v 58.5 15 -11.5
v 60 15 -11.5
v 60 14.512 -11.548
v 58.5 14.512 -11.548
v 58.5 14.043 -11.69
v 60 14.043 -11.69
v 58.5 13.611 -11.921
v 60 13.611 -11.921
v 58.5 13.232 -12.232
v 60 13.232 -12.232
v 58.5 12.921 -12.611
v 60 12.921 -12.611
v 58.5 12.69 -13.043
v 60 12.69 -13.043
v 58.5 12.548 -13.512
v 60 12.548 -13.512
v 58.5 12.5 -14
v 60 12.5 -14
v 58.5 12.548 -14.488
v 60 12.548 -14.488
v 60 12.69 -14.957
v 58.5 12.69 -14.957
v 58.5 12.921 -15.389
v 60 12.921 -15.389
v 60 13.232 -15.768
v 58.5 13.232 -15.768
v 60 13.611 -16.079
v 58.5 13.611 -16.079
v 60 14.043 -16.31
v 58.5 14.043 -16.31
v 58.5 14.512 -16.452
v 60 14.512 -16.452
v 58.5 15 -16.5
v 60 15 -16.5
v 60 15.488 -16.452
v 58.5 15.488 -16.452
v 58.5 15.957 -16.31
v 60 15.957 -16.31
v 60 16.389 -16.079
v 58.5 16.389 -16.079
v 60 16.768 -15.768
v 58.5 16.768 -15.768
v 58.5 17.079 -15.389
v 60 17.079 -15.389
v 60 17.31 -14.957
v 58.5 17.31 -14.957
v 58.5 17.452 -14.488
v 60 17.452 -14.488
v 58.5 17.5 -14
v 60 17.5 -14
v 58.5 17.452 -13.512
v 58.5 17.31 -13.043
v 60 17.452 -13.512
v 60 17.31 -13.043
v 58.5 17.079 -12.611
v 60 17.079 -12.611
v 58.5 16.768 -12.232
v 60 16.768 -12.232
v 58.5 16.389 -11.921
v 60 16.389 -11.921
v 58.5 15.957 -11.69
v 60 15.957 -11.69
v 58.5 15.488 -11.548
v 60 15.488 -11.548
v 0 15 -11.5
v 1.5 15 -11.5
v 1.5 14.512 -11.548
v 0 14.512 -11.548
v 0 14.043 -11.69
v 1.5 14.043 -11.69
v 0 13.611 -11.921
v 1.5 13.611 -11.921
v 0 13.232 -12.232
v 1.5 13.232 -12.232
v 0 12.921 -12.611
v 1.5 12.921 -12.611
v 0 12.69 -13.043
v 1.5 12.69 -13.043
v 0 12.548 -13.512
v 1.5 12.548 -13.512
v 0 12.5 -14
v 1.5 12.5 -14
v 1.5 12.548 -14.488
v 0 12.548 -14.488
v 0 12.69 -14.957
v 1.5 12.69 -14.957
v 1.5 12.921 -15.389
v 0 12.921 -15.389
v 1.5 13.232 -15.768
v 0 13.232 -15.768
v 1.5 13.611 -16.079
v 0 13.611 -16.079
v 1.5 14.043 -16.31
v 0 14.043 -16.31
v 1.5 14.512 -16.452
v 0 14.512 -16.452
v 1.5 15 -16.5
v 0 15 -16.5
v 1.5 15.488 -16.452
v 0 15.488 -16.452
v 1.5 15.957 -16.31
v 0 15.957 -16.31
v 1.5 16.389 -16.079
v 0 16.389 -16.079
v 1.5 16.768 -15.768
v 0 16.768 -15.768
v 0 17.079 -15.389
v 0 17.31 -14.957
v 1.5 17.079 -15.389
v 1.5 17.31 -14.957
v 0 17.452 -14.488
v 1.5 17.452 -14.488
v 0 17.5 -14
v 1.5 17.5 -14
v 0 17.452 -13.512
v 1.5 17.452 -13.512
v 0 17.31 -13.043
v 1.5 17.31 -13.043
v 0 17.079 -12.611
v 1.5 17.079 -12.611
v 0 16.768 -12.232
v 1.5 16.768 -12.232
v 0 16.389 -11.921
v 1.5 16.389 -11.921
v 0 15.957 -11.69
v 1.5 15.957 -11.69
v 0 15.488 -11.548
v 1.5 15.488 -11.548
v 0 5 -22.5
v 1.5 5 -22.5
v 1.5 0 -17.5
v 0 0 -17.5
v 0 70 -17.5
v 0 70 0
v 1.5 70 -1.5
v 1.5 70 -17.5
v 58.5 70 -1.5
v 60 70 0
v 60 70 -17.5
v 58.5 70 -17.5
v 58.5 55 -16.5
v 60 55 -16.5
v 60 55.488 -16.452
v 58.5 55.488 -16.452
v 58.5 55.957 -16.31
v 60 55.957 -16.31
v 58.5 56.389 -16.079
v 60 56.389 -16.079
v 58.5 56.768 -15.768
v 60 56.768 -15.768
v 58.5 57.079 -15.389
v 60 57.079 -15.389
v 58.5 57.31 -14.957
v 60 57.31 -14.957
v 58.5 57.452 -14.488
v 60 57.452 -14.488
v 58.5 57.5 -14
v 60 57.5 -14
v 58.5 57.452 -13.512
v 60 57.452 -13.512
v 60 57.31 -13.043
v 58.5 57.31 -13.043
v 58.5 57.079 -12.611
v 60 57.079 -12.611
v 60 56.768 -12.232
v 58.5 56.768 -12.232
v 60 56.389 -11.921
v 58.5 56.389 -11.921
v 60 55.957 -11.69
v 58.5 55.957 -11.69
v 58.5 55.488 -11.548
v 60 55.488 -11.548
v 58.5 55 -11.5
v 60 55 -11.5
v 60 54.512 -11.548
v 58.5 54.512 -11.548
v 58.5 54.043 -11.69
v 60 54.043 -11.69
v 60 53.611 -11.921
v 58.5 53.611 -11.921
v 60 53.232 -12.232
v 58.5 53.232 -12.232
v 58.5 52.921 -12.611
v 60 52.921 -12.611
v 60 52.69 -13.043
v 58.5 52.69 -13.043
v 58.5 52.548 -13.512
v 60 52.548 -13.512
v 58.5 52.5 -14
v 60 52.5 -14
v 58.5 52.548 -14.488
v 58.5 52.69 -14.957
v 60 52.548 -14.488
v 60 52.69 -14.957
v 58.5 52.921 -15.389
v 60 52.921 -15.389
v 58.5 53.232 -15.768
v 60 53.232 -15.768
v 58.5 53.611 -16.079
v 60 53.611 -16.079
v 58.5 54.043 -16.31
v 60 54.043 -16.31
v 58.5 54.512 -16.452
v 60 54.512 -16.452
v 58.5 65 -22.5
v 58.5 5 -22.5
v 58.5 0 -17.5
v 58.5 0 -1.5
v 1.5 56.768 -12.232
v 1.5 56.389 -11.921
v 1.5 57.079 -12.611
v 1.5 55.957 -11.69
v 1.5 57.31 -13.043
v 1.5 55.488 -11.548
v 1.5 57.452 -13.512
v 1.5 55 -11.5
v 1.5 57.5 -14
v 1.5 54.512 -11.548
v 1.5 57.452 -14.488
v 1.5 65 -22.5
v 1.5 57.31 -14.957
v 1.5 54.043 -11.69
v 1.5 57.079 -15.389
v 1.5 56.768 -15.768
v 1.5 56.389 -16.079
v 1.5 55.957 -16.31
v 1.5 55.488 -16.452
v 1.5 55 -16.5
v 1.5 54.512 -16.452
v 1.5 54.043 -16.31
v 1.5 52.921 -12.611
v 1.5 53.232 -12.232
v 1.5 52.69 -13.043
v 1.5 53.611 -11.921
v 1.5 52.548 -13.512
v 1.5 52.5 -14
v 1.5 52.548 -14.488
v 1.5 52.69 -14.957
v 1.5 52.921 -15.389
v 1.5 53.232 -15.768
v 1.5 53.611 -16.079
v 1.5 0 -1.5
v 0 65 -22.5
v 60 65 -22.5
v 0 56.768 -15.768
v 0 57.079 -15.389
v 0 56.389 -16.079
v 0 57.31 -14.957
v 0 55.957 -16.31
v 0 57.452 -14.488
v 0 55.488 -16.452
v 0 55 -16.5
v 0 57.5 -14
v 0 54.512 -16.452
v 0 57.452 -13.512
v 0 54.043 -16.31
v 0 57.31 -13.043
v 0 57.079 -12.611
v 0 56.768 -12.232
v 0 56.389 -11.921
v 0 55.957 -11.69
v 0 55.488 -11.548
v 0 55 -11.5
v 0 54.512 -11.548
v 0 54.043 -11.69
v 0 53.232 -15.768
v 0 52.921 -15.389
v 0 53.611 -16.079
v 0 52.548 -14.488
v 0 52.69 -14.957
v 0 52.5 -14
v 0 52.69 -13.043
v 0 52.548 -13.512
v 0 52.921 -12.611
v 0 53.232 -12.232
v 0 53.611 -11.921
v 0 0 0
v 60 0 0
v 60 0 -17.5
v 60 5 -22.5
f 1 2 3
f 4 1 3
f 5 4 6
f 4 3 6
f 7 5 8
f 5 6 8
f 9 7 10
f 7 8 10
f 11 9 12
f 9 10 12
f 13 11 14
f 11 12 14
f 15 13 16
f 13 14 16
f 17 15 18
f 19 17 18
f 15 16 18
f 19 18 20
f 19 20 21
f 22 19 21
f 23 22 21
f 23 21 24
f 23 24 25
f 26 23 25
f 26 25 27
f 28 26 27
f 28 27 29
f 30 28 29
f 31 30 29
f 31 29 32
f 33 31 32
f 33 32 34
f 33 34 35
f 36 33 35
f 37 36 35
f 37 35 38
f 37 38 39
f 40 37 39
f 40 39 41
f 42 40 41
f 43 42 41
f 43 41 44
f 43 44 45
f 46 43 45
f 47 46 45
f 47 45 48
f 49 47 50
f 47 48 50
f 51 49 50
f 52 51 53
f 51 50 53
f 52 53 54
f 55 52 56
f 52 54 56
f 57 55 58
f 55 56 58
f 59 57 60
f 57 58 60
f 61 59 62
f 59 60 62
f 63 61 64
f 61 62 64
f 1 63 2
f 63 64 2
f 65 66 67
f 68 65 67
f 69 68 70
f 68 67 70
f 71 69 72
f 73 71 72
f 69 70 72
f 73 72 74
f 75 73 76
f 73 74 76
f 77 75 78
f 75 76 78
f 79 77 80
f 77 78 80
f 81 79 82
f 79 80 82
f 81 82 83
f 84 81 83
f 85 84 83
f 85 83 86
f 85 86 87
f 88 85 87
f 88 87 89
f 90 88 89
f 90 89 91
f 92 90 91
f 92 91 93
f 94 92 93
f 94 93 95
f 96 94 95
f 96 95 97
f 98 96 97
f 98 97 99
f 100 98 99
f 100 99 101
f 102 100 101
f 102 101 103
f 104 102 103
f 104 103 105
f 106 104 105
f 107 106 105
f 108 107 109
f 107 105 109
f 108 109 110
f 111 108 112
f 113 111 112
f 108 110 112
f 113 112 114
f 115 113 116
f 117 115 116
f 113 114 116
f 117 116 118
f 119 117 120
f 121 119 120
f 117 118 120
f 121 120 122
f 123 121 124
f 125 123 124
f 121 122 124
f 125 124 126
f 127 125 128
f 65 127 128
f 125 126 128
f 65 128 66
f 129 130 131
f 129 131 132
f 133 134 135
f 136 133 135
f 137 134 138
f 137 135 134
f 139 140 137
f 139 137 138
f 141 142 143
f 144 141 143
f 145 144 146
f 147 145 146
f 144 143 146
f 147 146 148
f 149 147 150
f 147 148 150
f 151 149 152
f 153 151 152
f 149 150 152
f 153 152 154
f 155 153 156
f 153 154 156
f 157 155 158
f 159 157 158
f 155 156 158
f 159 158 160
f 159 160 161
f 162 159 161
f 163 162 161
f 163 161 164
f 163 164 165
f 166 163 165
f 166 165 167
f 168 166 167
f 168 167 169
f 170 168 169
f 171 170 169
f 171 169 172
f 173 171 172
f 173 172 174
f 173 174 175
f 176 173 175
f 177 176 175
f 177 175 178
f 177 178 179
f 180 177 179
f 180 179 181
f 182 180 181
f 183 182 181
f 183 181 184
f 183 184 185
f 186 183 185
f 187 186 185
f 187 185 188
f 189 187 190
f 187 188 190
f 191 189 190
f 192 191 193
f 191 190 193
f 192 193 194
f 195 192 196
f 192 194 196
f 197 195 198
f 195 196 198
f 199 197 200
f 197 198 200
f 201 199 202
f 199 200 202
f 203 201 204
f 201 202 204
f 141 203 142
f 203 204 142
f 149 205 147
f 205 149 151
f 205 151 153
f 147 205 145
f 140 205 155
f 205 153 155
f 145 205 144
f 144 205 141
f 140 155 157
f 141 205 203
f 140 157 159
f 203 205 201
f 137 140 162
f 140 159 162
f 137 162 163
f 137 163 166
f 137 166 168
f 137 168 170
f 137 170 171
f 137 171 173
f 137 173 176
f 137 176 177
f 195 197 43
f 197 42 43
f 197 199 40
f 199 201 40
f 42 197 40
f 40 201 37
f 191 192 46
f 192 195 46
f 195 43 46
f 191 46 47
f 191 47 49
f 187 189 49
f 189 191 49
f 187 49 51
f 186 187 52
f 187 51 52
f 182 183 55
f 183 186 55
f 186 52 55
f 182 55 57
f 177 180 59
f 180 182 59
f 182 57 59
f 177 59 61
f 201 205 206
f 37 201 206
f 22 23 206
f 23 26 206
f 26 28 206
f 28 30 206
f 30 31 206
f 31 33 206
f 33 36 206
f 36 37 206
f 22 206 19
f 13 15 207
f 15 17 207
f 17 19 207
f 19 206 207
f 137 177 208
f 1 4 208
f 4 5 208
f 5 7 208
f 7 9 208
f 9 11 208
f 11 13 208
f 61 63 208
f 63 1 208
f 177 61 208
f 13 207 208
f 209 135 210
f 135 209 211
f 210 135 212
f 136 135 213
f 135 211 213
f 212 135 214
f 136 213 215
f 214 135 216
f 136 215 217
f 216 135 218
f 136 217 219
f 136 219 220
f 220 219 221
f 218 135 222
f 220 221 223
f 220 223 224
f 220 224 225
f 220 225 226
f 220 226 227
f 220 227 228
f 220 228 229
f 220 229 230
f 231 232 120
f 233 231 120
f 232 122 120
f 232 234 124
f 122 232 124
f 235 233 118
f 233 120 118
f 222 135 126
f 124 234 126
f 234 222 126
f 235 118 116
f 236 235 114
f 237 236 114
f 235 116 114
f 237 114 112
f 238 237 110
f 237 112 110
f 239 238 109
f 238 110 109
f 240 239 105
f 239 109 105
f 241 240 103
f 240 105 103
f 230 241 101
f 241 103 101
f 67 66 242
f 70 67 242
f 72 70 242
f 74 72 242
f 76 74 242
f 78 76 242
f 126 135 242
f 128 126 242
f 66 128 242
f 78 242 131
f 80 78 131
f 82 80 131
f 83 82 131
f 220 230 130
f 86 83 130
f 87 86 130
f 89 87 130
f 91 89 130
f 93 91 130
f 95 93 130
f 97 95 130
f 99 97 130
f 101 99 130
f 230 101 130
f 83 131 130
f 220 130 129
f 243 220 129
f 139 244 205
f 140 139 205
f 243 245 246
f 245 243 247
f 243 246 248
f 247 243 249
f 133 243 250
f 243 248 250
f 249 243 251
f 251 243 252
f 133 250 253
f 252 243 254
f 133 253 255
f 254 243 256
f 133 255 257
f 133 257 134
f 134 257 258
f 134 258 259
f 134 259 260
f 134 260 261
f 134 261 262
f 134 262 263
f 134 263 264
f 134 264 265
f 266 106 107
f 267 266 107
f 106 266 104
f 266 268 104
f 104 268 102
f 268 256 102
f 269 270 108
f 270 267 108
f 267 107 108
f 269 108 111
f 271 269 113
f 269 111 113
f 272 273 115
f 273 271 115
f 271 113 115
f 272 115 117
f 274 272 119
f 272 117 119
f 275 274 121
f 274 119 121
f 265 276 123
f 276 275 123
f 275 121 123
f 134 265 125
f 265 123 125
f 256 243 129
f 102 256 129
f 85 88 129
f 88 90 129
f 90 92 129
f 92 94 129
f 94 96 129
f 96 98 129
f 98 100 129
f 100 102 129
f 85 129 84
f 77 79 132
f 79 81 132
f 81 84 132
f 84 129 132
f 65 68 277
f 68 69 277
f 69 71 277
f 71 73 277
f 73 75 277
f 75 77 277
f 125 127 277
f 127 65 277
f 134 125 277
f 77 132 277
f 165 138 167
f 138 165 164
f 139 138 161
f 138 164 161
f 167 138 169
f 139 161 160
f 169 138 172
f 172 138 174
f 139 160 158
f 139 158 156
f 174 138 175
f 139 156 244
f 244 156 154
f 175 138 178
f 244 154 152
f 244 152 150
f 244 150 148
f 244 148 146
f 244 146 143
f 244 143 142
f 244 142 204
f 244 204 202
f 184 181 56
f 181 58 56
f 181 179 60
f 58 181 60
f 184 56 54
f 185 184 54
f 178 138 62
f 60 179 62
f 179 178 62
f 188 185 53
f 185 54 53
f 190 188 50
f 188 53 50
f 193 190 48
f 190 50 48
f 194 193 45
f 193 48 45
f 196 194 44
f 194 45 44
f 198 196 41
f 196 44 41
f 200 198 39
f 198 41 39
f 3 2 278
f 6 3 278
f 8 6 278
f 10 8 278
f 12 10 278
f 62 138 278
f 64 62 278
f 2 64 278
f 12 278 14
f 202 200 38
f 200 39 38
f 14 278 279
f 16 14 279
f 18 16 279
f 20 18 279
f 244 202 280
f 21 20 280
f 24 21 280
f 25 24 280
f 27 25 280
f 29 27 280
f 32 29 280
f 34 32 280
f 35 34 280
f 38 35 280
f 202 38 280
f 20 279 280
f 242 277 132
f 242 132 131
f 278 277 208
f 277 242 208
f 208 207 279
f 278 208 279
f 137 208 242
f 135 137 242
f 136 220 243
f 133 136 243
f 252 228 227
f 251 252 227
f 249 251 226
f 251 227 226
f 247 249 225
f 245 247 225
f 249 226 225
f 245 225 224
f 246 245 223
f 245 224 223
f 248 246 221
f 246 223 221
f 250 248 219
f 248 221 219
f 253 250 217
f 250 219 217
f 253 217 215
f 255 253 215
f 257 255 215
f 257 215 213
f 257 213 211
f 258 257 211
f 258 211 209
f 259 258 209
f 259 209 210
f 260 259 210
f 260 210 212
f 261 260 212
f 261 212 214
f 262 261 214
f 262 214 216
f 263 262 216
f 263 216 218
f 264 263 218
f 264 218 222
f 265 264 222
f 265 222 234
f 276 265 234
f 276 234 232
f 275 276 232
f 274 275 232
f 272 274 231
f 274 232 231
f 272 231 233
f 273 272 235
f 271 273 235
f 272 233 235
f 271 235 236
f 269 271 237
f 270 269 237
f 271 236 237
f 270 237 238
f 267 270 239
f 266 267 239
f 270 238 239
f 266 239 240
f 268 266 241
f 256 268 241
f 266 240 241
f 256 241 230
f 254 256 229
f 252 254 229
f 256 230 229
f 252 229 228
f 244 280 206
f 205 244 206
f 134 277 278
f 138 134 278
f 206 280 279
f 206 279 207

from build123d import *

# Parameters (mm, degrees)
BOSS_EXTRUDE1_DEPTH = 70
SKETCH3_R           = 2.5
CUT_EXTRUDE1_DEPTH  = 60
CHAMFER1_SIZE       = 5


with BuildPart() as part:
    # Sketch1 → Boss-Extrude1 (new body)
    with BuildSketch(Plane(origin=(0, 0, 0), x_dir=(1, 0, 0), z_dir=(0, 1, 0))):
        Polygon((0, 0), (60, 0), (60, 22.5), (58.5, 22.5), (58.5, 1.5), (1.5, 1.5), (1.5, 22.5), (0, 22.5), align=None)
    extrude(amount=BOSS_EXTRUDE1_DEPTH)

    # Sketch3 → Cut-Extrude1 (cut)
    with BuildSketch(Plane(origin=(60, 0, 0), x_dir=(0, 0, -1), z_dir=(1, 0, 0))):
        with Locations((14, 55)):
            Circle(SKETCH3_R)
        with Locations(Location((14, 15, 0), (0, 0, 180))):
            Circle(SKETCH3_R)
    extrude(amount=-CUT_EXTRUDE1_DEPTH, mode=Mode.SUBTRACT)

    # Chamfer1
    chamfer1_edges = [part.edges().sort_by_distance(p)[0] for p in [
        (0.75, 0, -22.5),
        (59.25, 70, -22.5),
        (0.75, 70, -22.5),
        (59.25, 0, -22.5),
    ]]
    chamfer(chamfer1_edges, length=CHAMFER1_SIZE)


solid = part.part
